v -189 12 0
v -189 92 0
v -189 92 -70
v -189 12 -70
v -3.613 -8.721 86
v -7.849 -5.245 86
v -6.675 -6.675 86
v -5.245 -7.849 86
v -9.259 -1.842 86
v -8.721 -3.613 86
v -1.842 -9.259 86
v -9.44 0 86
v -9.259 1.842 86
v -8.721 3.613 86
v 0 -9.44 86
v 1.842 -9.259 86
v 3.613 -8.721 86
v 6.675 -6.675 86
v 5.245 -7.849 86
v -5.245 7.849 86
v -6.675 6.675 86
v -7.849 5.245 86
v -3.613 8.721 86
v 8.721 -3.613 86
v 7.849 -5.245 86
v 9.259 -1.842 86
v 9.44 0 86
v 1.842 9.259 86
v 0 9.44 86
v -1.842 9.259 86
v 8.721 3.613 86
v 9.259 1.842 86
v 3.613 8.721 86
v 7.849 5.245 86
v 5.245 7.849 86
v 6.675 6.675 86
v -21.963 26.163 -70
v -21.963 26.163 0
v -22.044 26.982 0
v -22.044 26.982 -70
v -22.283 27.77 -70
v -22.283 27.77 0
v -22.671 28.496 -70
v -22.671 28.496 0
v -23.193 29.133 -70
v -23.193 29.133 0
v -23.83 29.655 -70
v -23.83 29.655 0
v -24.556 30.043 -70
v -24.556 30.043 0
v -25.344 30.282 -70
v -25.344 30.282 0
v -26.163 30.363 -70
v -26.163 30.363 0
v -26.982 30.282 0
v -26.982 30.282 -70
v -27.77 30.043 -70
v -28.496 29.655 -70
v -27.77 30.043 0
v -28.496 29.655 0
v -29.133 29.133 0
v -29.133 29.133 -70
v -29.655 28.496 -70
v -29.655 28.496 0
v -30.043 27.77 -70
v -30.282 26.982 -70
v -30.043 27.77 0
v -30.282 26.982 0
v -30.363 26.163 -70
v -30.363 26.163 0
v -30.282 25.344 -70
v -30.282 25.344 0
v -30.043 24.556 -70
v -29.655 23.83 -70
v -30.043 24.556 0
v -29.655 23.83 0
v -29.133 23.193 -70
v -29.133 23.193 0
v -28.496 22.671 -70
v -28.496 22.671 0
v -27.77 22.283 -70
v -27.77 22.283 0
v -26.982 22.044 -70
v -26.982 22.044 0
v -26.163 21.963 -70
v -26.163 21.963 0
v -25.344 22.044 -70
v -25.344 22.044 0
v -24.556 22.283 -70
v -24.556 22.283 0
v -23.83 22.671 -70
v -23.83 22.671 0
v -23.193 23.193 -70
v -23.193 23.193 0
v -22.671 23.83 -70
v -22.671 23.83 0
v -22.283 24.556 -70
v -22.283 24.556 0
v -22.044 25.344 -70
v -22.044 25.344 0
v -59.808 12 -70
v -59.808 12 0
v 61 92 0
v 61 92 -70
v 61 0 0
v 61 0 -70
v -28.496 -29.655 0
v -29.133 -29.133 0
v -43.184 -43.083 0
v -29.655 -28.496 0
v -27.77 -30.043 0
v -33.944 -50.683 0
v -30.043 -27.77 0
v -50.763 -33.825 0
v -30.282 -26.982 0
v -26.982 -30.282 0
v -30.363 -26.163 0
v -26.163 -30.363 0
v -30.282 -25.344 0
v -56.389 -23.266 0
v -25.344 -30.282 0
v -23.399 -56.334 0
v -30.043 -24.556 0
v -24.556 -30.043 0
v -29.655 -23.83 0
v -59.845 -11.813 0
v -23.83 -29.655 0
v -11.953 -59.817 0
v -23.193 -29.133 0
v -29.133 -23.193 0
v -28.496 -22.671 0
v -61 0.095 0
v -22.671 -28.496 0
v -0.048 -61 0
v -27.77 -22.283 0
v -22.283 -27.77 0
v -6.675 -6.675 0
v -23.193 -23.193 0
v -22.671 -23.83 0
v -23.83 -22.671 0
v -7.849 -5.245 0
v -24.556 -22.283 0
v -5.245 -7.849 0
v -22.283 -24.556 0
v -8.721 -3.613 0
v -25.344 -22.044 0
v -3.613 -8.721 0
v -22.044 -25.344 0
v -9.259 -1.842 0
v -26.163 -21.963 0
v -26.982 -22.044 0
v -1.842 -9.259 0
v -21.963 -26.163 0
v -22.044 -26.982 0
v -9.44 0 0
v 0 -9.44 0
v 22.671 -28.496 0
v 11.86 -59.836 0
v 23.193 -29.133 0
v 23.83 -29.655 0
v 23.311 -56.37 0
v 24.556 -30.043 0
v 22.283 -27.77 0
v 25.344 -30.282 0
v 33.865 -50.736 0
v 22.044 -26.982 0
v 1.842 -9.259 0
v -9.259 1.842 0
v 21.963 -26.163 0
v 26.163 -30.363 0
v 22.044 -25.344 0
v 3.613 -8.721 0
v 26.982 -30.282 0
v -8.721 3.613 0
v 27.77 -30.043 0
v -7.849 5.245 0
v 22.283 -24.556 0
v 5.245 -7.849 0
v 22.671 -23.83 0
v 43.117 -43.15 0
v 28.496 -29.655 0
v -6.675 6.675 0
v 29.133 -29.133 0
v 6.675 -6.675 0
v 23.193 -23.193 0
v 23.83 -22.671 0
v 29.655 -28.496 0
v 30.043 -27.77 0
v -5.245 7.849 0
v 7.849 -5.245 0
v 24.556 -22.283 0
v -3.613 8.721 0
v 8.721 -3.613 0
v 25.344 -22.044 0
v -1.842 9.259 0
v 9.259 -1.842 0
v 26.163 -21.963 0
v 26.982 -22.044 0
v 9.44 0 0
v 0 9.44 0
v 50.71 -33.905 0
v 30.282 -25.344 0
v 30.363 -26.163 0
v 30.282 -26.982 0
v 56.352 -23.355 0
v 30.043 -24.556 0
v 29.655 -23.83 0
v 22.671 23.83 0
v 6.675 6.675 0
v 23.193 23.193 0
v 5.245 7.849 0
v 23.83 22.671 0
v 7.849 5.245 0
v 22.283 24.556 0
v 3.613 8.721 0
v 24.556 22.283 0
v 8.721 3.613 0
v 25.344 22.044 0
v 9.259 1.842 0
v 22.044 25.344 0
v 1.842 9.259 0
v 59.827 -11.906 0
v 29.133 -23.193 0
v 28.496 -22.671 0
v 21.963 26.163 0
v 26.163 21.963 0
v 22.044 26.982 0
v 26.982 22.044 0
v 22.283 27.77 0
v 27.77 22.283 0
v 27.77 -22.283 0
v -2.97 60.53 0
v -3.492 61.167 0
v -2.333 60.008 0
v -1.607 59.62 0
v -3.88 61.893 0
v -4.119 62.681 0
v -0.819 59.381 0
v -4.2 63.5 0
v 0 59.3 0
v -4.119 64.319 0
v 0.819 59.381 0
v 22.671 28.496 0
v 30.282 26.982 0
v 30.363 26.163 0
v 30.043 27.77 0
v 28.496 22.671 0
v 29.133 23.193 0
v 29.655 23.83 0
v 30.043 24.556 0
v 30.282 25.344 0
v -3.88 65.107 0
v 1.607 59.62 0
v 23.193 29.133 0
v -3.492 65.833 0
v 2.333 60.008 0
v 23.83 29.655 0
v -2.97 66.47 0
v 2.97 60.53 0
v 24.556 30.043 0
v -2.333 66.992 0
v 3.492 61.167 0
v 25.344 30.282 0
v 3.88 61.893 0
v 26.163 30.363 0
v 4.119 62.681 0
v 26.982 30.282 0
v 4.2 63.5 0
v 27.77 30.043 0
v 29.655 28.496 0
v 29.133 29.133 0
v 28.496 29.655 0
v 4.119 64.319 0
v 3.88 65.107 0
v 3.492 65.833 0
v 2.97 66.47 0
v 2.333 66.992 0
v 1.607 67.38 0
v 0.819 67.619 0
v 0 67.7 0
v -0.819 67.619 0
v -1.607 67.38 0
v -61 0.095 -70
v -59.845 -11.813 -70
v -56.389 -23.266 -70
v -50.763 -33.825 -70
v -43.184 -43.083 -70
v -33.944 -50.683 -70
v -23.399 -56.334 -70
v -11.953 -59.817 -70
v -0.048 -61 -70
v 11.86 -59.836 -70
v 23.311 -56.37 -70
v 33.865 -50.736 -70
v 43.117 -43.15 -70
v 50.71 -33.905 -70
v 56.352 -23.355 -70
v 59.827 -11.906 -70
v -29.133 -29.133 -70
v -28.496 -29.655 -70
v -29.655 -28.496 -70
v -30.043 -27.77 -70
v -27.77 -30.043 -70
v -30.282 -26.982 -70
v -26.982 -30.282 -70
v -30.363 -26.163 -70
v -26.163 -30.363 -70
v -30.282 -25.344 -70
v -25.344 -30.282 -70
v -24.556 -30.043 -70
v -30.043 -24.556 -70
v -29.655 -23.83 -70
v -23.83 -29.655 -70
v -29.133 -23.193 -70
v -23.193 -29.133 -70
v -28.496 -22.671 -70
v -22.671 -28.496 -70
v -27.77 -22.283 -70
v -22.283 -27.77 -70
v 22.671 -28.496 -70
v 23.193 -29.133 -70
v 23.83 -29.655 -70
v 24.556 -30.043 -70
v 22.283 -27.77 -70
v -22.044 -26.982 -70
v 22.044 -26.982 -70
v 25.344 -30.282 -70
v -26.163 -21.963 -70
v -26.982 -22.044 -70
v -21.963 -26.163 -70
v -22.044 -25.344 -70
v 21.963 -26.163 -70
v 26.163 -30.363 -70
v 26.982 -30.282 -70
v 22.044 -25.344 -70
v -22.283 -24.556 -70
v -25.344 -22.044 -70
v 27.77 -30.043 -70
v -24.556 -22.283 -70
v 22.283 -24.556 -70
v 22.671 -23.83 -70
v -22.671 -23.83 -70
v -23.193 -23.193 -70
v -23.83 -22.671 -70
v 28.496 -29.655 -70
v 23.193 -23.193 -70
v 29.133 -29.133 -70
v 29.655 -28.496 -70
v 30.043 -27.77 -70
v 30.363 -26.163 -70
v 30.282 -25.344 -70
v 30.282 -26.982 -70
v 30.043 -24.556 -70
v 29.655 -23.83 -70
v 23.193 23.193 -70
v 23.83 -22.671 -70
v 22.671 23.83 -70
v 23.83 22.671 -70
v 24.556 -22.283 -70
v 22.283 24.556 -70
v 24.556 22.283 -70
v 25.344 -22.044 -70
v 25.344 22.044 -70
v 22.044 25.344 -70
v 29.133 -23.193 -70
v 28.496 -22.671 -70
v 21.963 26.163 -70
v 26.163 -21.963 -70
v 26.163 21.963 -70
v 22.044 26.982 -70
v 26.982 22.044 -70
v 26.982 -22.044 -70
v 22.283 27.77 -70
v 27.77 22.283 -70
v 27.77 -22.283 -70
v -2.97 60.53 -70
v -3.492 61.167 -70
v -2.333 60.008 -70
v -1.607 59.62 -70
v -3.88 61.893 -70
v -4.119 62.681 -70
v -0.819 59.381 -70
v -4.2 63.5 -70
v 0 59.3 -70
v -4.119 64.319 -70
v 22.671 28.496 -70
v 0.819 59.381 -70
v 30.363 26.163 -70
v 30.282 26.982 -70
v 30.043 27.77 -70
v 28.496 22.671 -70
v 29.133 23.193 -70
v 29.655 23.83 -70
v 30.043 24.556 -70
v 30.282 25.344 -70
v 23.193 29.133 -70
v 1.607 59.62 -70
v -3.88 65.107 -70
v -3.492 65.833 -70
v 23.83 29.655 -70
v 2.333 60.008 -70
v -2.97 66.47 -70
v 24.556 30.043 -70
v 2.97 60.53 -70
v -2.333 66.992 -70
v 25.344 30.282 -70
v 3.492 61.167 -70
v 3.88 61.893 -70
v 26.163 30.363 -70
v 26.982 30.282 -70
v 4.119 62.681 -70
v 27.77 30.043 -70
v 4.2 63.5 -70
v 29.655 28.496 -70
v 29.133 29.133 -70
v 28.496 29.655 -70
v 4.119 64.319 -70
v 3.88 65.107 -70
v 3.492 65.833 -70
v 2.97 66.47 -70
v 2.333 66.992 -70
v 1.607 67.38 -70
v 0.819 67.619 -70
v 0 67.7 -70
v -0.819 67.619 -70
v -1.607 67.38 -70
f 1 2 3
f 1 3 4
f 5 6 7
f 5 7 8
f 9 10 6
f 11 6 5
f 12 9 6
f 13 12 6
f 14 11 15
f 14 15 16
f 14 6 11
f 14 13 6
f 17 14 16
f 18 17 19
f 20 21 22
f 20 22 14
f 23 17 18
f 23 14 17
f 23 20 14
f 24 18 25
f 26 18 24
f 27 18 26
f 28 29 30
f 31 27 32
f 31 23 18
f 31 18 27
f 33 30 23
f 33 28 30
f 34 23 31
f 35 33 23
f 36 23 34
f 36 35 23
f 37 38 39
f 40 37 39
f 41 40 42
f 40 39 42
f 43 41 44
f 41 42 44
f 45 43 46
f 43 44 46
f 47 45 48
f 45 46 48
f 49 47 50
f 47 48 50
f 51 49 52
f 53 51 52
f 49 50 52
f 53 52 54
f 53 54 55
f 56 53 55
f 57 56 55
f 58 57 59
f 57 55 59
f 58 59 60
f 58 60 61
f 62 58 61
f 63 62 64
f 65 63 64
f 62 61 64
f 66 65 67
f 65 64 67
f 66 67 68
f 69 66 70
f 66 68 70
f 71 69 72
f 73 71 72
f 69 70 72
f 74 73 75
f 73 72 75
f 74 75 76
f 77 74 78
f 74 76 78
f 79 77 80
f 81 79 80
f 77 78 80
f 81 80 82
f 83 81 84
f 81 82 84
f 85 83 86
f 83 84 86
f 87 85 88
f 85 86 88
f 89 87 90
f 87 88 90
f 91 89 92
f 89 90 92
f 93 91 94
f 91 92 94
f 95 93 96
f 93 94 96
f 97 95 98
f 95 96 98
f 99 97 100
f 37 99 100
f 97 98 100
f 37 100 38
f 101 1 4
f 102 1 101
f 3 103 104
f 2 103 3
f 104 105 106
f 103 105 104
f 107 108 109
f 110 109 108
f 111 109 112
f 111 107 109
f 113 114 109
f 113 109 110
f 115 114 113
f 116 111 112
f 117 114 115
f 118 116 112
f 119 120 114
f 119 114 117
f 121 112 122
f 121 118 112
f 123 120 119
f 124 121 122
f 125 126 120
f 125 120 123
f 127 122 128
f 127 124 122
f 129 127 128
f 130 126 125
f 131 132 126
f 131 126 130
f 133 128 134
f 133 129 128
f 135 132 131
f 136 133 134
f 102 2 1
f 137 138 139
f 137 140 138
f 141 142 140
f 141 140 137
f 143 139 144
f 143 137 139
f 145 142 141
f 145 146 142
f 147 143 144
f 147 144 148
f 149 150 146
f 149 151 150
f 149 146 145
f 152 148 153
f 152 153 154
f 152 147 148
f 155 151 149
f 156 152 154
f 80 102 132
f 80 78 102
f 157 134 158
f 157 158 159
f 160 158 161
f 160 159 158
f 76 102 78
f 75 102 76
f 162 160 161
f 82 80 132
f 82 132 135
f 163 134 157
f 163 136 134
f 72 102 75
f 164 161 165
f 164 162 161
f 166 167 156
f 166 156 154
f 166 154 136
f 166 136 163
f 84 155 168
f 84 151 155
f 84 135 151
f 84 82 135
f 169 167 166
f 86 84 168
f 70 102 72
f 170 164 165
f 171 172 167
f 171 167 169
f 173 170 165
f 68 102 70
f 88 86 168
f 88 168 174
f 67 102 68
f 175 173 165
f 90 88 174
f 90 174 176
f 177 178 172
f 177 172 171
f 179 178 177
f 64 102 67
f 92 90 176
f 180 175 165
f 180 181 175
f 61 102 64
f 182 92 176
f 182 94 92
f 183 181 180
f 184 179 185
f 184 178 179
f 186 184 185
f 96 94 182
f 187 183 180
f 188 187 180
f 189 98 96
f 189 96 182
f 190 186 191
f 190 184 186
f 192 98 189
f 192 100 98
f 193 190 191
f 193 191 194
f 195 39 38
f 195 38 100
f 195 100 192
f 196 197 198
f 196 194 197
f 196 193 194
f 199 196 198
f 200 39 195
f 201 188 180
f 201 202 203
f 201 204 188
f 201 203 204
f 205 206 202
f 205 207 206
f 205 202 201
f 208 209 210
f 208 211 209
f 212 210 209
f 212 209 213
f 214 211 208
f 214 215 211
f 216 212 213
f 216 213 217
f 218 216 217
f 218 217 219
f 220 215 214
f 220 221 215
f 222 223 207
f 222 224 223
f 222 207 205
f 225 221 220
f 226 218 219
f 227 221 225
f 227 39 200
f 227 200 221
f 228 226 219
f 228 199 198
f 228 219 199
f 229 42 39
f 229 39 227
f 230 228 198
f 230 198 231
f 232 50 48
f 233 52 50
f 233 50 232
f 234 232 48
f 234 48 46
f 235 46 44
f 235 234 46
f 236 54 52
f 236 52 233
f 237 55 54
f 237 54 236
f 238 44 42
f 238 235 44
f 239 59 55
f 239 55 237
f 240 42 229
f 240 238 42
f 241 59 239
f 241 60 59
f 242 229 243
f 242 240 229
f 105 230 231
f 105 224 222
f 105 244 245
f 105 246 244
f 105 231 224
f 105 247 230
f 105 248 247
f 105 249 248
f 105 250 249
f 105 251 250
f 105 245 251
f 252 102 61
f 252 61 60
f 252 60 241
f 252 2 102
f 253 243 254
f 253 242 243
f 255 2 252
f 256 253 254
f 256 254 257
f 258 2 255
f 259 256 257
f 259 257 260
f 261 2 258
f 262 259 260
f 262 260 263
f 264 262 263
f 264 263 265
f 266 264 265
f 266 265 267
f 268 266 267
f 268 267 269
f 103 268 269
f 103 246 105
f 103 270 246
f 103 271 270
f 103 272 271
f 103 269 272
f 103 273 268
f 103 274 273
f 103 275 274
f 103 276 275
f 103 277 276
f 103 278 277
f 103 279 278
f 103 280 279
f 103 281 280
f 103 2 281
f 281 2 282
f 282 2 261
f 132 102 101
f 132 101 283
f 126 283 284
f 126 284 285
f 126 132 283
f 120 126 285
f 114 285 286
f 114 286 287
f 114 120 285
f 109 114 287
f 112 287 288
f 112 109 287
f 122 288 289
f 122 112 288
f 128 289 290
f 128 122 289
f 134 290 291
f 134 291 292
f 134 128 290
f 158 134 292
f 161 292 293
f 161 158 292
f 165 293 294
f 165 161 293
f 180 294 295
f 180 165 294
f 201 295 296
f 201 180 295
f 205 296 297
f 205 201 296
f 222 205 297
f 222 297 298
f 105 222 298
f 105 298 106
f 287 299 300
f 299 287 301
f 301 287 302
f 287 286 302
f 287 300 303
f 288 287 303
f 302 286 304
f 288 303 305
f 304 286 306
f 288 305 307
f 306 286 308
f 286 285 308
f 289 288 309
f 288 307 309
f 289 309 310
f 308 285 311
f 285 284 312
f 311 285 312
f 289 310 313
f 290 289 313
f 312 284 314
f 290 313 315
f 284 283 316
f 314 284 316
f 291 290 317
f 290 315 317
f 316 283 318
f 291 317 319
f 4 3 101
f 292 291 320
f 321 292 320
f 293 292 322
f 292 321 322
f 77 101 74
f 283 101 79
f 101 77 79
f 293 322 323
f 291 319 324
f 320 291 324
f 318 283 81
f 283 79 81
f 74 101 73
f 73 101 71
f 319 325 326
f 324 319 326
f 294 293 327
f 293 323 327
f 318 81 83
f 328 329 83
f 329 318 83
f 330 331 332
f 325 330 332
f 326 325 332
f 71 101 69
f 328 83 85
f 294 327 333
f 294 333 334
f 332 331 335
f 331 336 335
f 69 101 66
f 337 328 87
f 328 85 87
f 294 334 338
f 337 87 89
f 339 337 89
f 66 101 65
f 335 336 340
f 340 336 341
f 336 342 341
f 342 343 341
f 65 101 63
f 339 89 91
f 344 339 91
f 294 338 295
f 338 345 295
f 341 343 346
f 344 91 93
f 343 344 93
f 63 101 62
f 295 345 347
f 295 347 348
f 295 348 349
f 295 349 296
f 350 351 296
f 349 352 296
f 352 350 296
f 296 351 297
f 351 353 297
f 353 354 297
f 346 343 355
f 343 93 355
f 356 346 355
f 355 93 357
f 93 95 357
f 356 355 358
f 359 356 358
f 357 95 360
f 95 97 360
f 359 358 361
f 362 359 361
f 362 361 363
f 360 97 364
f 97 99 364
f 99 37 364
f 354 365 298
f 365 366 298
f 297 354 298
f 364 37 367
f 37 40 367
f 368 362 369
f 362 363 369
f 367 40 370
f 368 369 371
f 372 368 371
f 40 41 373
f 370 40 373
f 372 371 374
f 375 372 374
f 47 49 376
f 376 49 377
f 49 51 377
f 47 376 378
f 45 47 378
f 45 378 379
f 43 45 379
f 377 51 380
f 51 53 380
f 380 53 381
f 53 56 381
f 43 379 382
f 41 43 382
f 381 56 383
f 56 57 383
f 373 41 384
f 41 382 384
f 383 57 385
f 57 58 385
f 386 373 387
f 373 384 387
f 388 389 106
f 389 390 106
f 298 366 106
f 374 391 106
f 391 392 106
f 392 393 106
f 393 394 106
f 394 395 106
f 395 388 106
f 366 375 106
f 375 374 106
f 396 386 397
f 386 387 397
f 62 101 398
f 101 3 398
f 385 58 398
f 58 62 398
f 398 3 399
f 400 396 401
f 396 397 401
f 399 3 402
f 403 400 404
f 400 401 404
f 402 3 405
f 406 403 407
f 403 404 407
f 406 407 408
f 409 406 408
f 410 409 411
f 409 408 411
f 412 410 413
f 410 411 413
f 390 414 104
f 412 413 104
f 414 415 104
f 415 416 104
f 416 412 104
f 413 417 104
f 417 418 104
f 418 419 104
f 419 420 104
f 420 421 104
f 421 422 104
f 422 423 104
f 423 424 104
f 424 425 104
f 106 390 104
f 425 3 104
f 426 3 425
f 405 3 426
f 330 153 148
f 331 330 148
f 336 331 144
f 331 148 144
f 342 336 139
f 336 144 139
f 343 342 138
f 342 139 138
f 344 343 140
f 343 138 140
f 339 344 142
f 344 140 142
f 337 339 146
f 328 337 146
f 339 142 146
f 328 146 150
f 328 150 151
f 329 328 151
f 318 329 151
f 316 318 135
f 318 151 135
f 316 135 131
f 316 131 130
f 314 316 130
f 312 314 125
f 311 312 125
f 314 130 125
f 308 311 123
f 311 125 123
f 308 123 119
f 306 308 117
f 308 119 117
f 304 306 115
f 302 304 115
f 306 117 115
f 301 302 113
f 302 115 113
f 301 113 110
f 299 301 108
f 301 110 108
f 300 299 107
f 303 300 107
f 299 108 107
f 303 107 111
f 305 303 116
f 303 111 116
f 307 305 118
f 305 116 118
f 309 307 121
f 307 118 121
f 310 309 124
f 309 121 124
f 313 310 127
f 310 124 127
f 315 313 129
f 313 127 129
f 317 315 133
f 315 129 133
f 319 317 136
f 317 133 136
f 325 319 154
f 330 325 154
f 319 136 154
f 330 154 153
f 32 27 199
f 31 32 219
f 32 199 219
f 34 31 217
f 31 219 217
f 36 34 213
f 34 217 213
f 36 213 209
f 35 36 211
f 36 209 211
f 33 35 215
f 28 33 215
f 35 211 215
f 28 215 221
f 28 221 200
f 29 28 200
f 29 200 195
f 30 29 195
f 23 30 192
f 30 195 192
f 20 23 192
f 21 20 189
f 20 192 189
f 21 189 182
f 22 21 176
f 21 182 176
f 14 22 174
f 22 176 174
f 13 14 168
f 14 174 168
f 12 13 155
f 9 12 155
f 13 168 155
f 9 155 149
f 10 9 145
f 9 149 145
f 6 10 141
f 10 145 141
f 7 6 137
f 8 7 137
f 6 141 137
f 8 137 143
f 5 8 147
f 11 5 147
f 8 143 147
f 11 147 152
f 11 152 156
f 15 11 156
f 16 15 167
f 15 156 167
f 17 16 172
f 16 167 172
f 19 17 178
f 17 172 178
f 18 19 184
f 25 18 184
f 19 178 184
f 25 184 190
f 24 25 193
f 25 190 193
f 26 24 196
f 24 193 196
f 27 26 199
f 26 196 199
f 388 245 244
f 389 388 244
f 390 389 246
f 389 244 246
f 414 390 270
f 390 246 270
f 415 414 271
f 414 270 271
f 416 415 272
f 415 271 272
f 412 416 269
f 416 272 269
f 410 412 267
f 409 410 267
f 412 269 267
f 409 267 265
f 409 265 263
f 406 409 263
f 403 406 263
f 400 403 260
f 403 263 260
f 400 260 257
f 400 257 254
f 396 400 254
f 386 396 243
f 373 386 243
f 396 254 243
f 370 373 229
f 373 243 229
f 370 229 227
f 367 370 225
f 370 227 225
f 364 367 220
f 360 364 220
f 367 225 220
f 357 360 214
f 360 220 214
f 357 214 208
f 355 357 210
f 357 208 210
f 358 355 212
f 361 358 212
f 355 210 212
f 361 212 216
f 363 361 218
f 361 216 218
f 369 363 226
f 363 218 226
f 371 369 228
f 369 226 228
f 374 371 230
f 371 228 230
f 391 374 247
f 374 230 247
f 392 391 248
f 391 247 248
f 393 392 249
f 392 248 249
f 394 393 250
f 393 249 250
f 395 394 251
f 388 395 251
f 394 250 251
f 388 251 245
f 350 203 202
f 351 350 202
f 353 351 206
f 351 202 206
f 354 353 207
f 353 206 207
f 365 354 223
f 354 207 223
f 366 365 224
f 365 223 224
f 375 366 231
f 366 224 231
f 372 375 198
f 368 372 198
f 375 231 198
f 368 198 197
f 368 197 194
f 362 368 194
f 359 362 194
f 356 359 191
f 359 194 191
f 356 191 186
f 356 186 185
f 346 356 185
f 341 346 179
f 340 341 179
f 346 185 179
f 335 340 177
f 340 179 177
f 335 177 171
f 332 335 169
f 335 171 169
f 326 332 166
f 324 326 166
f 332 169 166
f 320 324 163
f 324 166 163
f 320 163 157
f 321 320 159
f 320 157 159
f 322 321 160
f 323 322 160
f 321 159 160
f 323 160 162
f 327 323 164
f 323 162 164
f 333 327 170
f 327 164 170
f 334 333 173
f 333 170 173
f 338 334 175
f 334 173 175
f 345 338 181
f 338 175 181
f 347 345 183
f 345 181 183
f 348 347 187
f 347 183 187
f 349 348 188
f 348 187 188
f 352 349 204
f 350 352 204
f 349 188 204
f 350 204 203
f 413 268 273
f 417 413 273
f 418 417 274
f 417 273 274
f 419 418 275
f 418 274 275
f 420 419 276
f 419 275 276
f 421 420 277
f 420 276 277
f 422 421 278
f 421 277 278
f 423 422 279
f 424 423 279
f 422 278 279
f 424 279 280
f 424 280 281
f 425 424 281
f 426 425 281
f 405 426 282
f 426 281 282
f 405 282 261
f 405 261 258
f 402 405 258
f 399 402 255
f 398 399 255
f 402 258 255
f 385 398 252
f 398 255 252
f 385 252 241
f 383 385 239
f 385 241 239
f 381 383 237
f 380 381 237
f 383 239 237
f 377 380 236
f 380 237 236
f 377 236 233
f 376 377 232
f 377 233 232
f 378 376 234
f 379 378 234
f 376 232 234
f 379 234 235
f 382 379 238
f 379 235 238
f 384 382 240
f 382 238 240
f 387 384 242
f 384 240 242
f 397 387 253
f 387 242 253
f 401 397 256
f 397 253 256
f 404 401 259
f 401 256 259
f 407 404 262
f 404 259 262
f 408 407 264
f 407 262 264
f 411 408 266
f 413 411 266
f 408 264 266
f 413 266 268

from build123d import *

# Parameters (mm, degrees)
SKETCH1_R           = 4.2
BOSS_EXTRUDE1_DEPTH = 70
SKETCH2_R           = 9.44
BOSS_EXTRUDE2_DEPTH = 86


with BuildPart() as part:
    # Sketch1 → Boss-Extrude1 (new body)
    with BuildSketch(Plane.XY):
        with BuildLine():
            Line((61, 0), (61, 92))
            Line((61, 92), (-189, 92))
            Line((-189, 92), (-189, 12))
            Line((-189, 12), (-59.808026217, 12))
            ThreePointArc((-59.808026217, 12), (-6.029527376, -60.701275107), (61, 0))
        make_face()
        with Locations((26.162950904, 26.162950904)):
            Circle(SKETCH1_R, mode=Mode.SUBTRACT)
        with Locations((26.162950904, -26.162950904)):
            Circle(SKETCH1_R, mode=Mode.SUBTRACT)
        with Locations((-26.162950904, -26.162950904)):
            Circle(SKETCH1_R, mode=Mode.SUBTRACT)
        with Locations((-26.162950904, 26.162950904)):
            Circle(SKETCH1_R, mode=Mode.SUBTRACT)
        with Locations((0, 63.5)):
            Circle(SKETCH1_R, mode=Mode.SUBTRACT)
    extrude(amount=-BOSS_EXTRUDE1_DEPTH)

    # Sketch2 → Boss-Extrude2 (add)
    with BuildSketch(Plane.XY):
        Circle(SKETCH2_R)
    extrude(amount=BOSS_EXTRUDE2_DEPTH)


solid = part.part
